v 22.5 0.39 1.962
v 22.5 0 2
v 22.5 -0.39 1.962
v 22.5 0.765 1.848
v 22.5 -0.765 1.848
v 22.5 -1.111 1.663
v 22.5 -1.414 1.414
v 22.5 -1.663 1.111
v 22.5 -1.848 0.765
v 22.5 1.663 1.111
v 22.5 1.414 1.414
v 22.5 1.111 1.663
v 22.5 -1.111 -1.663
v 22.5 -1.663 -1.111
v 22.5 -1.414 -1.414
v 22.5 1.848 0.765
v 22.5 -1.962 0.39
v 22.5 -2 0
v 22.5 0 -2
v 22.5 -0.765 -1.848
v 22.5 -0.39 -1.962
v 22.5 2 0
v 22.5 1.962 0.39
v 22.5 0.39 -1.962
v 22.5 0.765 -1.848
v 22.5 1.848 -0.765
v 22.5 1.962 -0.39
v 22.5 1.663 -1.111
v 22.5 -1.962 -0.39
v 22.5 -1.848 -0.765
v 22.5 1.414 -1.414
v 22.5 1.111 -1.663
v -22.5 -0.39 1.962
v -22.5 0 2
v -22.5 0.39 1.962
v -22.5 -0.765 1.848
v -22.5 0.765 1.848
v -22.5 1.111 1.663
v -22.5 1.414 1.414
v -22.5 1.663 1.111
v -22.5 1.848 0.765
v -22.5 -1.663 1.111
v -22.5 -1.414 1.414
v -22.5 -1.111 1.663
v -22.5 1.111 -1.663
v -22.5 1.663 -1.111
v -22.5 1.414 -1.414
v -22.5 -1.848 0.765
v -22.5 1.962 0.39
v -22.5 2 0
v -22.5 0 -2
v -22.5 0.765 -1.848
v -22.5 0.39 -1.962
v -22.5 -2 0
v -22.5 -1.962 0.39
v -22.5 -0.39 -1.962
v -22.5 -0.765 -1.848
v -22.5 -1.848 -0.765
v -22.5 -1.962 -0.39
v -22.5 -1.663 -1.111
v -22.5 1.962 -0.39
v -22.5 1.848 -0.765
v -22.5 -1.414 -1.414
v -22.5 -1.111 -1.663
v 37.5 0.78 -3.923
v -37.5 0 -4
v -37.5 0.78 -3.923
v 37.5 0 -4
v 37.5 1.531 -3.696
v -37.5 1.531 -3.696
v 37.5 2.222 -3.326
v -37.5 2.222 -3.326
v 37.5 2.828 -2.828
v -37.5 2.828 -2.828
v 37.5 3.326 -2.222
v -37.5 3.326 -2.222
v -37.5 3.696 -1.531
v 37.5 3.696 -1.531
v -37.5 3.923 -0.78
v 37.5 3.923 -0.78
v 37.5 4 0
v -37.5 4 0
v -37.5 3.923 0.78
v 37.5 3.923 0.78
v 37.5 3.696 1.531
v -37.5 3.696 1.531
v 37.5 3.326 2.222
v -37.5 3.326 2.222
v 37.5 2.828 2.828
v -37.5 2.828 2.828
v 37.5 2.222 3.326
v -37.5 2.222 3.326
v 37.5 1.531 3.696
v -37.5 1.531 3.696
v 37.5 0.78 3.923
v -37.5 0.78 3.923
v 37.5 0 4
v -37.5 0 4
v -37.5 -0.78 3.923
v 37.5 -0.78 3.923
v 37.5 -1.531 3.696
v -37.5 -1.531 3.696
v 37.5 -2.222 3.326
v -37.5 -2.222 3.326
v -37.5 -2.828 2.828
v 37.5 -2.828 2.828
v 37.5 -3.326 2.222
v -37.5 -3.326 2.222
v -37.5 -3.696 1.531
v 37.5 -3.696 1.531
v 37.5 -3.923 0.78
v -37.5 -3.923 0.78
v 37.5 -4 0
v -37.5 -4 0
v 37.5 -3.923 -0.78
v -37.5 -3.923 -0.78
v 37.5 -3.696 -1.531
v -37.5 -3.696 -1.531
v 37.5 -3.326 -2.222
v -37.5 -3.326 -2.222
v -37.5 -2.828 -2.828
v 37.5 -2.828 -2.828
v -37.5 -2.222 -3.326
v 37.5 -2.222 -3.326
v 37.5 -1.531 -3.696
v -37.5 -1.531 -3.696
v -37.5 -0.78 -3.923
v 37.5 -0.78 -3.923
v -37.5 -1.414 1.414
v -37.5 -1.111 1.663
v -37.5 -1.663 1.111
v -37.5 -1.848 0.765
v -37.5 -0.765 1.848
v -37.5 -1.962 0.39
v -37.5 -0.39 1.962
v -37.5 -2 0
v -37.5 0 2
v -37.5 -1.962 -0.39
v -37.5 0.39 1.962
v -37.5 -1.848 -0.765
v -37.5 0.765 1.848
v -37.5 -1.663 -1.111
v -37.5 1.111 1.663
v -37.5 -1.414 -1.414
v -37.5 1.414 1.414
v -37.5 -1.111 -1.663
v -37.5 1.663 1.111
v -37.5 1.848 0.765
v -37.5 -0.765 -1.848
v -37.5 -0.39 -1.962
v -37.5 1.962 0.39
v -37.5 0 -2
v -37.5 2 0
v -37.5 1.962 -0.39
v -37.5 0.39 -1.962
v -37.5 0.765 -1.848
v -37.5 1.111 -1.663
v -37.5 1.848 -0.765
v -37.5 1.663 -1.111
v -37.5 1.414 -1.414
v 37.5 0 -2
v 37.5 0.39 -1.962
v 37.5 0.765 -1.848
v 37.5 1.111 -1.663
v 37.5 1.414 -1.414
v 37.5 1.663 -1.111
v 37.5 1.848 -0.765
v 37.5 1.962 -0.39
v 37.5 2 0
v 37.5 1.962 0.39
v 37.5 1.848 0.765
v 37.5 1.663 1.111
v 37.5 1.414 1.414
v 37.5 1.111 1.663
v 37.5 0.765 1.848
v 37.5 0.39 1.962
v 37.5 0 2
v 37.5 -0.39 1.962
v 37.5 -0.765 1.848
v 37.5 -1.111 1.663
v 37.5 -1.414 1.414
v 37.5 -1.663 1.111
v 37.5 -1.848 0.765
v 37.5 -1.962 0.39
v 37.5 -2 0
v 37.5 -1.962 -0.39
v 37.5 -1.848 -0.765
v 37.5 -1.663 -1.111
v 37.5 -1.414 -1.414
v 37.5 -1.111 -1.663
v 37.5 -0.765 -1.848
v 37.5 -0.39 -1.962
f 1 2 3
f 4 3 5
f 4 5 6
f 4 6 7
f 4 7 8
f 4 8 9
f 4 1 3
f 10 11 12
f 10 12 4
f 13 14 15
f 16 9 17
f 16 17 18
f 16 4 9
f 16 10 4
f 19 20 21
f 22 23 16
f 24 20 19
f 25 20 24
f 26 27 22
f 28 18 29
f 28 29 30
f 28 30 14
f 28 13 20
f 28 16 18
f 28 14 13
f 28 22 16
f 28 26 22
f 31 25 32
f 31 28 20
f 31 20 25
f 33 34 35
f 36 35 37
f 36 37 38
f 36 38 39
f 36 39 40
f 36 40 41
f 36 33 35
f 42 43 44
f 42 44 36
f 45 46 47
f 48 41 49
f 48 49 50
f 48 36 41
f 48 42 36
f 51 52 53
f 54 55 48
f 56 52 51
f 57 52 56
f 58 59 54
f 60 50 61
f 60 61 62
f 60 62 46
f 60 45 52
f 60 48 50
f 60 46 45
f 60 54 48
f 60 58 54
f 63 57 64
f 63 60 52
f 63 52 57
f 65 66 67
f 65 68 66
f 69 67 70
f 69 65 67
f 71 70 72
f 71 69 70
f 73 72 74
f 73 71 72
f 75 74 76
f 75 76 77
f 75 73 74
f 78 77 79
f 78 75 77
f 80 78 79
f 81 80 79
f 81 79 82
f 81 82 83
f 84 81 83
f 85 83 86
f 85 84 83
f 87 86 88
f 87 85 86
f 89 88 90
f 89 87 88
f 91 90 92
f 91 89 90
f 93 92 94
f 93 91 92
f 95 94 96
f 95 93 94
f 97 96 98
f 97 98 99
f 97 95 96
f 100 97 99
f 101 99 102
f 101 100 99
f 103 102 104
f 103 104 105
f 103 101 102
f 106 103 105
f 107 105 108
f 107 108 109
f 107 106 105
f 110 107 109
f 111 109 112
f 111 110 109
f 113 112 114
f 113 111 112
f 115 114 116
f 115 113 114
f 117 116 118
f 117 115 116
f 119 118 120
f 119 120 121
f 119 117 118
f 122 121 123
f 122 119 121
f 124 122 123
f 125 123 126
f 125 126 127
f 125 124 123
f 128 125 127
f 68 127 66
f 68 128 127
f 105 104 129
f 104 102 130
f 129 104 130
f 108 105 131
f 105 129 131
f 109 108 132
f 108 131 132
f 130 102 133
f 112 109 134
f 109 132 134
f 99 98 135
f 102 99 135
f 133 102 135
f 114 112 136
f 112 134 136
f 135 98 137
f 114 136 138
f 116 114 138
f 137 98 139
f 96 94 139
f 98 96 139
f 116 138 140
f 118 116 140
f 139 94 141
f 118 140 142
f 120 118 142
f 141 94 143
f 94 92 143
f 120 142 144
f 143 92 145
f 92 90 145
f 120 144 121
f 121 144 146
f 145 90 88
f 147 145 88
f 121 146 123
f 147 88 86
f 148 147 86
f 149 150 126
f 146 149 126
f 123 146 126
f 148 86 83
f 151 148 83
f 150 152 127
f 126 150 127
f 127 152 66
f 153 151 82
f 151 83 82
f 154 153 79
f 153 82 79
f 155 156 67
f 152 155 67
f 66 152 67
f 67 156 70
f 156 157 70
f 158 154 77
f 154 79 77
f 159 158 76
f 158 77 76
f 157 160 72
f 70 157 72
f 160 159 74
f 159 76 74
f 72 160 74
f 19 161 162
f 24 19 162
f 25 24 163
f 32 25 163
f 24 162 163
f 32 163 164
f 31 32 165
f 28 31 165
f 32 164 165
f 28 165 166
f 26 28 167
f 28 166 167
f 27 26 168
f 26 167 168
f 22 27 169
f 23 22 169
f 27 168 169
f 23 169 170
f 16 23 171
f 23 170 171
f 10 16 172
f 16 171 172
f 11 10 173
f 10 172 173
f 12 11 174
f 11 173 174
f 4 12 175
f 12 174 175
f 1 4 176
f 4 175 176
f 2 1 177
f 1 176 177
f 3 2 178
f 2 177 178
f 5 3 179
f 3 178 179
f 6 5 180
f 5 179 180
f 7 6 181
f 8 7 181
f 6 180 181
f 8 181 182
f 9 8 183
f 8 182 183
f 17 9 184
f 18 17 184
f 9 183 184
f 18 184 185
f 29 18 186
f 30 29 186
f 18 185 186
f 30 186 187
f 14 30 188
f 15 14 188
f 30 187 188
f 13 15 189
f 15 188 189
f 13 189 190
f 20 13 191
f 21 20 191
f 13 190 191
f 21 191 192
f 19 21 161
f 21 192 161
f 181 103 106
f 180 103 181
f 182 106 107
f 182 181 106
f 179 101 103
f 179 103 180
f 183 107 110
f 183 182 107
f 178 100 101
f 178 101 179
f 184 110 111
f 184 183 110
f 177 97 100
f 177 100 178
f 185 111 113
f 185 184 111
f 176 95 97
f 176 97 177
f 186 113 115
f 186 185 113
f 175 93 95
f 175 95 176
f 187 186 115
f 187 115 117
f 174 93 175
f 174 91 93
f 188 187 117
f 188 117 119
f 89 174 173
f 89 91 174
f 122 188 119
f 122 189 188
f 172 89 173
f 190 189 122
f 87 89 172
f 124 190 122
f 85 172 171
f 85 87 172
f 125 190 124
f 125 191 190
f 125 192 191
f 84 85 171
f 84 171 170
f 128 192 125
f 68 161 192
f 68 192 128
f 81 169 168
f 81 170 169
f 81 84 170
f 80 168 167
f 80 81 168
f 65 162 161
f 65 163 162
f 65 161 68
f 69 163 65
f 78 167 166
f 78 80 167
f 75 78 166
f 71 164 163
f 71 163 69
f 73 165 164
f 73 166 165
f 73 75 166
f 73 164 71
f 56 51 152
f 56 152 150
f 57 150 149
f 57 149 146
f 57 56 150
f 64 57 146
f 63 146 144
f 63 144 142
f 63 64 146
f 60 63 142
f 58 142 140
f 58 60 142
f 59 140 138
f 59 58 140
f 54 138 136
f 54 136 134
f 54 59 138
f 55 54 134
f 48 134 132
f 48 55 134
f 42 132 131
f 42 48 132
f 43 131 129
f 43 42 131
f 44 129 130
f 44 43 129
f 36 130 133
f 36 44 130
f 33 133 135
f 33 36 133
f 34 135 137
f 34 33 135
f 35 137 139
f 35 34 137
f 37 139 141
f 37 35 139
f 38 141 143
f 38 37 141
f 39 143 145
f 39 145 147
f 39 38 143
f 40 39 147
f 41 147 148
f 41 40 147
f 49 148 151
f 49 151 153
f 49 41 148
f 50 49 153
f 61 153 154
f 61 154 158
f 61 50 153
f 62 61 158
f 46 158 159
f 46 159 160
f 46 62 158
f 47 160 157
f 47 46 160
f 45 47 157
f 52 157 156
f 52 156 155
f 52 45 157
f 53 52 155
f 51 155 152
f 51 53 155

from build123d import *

# Parameters (mm, degrees)
SKETCH1_R           = 4
BOSS_EXTRUDE1_DEPTH = 37.5
SKETCH2_R           = 2
CUT_EXTRUDE1_DEPTH  = 15
CUT_EXTRUDE2_START  = -15
SKETCH3_R           = 2
CUT_EXTRUDE2_DEPTH  = 15


with BuildPart() as part:
    # Sketch1 → Boss-Extrude1 (new, symmetric)
    with BuildSketch(Plane(origin=(0, 0, 0), x_dir=(0, 0, -1), z_dir=(1, 0, 0))):
        Circle(SKETCH1_R)
    extrude(amount=BOSS_EXTRUDE1_DEPTH, both=True)

    # Sketch2 → Cut-Extrude1 (cut)
    with BuildSketch(Plane(origin=(37.5, 0, 0), x_dir=(0, 0, -1), z_dir=(1, 0, 0))):
        Circle(SKETCH2_R)
    extrude(amount=-CUT_EXTRUDE1_DEPTH, mode=Mode.SUBTRACT)

    # Sketch3 → Cut-Extrude2 (cut)
    with BuildSketch(Plane.ZY.offset(37.5).offset(CUT_EXTRUDE2_START)):
        with Locations(Location((0, 0, 0), (0, 0, 180))):
            Circle(SKETCH3_R)
    extrude(amount=CUT_EXTRUDE2_DEPTH, mode=Mode.SUBTRACT)


solid = part.part
